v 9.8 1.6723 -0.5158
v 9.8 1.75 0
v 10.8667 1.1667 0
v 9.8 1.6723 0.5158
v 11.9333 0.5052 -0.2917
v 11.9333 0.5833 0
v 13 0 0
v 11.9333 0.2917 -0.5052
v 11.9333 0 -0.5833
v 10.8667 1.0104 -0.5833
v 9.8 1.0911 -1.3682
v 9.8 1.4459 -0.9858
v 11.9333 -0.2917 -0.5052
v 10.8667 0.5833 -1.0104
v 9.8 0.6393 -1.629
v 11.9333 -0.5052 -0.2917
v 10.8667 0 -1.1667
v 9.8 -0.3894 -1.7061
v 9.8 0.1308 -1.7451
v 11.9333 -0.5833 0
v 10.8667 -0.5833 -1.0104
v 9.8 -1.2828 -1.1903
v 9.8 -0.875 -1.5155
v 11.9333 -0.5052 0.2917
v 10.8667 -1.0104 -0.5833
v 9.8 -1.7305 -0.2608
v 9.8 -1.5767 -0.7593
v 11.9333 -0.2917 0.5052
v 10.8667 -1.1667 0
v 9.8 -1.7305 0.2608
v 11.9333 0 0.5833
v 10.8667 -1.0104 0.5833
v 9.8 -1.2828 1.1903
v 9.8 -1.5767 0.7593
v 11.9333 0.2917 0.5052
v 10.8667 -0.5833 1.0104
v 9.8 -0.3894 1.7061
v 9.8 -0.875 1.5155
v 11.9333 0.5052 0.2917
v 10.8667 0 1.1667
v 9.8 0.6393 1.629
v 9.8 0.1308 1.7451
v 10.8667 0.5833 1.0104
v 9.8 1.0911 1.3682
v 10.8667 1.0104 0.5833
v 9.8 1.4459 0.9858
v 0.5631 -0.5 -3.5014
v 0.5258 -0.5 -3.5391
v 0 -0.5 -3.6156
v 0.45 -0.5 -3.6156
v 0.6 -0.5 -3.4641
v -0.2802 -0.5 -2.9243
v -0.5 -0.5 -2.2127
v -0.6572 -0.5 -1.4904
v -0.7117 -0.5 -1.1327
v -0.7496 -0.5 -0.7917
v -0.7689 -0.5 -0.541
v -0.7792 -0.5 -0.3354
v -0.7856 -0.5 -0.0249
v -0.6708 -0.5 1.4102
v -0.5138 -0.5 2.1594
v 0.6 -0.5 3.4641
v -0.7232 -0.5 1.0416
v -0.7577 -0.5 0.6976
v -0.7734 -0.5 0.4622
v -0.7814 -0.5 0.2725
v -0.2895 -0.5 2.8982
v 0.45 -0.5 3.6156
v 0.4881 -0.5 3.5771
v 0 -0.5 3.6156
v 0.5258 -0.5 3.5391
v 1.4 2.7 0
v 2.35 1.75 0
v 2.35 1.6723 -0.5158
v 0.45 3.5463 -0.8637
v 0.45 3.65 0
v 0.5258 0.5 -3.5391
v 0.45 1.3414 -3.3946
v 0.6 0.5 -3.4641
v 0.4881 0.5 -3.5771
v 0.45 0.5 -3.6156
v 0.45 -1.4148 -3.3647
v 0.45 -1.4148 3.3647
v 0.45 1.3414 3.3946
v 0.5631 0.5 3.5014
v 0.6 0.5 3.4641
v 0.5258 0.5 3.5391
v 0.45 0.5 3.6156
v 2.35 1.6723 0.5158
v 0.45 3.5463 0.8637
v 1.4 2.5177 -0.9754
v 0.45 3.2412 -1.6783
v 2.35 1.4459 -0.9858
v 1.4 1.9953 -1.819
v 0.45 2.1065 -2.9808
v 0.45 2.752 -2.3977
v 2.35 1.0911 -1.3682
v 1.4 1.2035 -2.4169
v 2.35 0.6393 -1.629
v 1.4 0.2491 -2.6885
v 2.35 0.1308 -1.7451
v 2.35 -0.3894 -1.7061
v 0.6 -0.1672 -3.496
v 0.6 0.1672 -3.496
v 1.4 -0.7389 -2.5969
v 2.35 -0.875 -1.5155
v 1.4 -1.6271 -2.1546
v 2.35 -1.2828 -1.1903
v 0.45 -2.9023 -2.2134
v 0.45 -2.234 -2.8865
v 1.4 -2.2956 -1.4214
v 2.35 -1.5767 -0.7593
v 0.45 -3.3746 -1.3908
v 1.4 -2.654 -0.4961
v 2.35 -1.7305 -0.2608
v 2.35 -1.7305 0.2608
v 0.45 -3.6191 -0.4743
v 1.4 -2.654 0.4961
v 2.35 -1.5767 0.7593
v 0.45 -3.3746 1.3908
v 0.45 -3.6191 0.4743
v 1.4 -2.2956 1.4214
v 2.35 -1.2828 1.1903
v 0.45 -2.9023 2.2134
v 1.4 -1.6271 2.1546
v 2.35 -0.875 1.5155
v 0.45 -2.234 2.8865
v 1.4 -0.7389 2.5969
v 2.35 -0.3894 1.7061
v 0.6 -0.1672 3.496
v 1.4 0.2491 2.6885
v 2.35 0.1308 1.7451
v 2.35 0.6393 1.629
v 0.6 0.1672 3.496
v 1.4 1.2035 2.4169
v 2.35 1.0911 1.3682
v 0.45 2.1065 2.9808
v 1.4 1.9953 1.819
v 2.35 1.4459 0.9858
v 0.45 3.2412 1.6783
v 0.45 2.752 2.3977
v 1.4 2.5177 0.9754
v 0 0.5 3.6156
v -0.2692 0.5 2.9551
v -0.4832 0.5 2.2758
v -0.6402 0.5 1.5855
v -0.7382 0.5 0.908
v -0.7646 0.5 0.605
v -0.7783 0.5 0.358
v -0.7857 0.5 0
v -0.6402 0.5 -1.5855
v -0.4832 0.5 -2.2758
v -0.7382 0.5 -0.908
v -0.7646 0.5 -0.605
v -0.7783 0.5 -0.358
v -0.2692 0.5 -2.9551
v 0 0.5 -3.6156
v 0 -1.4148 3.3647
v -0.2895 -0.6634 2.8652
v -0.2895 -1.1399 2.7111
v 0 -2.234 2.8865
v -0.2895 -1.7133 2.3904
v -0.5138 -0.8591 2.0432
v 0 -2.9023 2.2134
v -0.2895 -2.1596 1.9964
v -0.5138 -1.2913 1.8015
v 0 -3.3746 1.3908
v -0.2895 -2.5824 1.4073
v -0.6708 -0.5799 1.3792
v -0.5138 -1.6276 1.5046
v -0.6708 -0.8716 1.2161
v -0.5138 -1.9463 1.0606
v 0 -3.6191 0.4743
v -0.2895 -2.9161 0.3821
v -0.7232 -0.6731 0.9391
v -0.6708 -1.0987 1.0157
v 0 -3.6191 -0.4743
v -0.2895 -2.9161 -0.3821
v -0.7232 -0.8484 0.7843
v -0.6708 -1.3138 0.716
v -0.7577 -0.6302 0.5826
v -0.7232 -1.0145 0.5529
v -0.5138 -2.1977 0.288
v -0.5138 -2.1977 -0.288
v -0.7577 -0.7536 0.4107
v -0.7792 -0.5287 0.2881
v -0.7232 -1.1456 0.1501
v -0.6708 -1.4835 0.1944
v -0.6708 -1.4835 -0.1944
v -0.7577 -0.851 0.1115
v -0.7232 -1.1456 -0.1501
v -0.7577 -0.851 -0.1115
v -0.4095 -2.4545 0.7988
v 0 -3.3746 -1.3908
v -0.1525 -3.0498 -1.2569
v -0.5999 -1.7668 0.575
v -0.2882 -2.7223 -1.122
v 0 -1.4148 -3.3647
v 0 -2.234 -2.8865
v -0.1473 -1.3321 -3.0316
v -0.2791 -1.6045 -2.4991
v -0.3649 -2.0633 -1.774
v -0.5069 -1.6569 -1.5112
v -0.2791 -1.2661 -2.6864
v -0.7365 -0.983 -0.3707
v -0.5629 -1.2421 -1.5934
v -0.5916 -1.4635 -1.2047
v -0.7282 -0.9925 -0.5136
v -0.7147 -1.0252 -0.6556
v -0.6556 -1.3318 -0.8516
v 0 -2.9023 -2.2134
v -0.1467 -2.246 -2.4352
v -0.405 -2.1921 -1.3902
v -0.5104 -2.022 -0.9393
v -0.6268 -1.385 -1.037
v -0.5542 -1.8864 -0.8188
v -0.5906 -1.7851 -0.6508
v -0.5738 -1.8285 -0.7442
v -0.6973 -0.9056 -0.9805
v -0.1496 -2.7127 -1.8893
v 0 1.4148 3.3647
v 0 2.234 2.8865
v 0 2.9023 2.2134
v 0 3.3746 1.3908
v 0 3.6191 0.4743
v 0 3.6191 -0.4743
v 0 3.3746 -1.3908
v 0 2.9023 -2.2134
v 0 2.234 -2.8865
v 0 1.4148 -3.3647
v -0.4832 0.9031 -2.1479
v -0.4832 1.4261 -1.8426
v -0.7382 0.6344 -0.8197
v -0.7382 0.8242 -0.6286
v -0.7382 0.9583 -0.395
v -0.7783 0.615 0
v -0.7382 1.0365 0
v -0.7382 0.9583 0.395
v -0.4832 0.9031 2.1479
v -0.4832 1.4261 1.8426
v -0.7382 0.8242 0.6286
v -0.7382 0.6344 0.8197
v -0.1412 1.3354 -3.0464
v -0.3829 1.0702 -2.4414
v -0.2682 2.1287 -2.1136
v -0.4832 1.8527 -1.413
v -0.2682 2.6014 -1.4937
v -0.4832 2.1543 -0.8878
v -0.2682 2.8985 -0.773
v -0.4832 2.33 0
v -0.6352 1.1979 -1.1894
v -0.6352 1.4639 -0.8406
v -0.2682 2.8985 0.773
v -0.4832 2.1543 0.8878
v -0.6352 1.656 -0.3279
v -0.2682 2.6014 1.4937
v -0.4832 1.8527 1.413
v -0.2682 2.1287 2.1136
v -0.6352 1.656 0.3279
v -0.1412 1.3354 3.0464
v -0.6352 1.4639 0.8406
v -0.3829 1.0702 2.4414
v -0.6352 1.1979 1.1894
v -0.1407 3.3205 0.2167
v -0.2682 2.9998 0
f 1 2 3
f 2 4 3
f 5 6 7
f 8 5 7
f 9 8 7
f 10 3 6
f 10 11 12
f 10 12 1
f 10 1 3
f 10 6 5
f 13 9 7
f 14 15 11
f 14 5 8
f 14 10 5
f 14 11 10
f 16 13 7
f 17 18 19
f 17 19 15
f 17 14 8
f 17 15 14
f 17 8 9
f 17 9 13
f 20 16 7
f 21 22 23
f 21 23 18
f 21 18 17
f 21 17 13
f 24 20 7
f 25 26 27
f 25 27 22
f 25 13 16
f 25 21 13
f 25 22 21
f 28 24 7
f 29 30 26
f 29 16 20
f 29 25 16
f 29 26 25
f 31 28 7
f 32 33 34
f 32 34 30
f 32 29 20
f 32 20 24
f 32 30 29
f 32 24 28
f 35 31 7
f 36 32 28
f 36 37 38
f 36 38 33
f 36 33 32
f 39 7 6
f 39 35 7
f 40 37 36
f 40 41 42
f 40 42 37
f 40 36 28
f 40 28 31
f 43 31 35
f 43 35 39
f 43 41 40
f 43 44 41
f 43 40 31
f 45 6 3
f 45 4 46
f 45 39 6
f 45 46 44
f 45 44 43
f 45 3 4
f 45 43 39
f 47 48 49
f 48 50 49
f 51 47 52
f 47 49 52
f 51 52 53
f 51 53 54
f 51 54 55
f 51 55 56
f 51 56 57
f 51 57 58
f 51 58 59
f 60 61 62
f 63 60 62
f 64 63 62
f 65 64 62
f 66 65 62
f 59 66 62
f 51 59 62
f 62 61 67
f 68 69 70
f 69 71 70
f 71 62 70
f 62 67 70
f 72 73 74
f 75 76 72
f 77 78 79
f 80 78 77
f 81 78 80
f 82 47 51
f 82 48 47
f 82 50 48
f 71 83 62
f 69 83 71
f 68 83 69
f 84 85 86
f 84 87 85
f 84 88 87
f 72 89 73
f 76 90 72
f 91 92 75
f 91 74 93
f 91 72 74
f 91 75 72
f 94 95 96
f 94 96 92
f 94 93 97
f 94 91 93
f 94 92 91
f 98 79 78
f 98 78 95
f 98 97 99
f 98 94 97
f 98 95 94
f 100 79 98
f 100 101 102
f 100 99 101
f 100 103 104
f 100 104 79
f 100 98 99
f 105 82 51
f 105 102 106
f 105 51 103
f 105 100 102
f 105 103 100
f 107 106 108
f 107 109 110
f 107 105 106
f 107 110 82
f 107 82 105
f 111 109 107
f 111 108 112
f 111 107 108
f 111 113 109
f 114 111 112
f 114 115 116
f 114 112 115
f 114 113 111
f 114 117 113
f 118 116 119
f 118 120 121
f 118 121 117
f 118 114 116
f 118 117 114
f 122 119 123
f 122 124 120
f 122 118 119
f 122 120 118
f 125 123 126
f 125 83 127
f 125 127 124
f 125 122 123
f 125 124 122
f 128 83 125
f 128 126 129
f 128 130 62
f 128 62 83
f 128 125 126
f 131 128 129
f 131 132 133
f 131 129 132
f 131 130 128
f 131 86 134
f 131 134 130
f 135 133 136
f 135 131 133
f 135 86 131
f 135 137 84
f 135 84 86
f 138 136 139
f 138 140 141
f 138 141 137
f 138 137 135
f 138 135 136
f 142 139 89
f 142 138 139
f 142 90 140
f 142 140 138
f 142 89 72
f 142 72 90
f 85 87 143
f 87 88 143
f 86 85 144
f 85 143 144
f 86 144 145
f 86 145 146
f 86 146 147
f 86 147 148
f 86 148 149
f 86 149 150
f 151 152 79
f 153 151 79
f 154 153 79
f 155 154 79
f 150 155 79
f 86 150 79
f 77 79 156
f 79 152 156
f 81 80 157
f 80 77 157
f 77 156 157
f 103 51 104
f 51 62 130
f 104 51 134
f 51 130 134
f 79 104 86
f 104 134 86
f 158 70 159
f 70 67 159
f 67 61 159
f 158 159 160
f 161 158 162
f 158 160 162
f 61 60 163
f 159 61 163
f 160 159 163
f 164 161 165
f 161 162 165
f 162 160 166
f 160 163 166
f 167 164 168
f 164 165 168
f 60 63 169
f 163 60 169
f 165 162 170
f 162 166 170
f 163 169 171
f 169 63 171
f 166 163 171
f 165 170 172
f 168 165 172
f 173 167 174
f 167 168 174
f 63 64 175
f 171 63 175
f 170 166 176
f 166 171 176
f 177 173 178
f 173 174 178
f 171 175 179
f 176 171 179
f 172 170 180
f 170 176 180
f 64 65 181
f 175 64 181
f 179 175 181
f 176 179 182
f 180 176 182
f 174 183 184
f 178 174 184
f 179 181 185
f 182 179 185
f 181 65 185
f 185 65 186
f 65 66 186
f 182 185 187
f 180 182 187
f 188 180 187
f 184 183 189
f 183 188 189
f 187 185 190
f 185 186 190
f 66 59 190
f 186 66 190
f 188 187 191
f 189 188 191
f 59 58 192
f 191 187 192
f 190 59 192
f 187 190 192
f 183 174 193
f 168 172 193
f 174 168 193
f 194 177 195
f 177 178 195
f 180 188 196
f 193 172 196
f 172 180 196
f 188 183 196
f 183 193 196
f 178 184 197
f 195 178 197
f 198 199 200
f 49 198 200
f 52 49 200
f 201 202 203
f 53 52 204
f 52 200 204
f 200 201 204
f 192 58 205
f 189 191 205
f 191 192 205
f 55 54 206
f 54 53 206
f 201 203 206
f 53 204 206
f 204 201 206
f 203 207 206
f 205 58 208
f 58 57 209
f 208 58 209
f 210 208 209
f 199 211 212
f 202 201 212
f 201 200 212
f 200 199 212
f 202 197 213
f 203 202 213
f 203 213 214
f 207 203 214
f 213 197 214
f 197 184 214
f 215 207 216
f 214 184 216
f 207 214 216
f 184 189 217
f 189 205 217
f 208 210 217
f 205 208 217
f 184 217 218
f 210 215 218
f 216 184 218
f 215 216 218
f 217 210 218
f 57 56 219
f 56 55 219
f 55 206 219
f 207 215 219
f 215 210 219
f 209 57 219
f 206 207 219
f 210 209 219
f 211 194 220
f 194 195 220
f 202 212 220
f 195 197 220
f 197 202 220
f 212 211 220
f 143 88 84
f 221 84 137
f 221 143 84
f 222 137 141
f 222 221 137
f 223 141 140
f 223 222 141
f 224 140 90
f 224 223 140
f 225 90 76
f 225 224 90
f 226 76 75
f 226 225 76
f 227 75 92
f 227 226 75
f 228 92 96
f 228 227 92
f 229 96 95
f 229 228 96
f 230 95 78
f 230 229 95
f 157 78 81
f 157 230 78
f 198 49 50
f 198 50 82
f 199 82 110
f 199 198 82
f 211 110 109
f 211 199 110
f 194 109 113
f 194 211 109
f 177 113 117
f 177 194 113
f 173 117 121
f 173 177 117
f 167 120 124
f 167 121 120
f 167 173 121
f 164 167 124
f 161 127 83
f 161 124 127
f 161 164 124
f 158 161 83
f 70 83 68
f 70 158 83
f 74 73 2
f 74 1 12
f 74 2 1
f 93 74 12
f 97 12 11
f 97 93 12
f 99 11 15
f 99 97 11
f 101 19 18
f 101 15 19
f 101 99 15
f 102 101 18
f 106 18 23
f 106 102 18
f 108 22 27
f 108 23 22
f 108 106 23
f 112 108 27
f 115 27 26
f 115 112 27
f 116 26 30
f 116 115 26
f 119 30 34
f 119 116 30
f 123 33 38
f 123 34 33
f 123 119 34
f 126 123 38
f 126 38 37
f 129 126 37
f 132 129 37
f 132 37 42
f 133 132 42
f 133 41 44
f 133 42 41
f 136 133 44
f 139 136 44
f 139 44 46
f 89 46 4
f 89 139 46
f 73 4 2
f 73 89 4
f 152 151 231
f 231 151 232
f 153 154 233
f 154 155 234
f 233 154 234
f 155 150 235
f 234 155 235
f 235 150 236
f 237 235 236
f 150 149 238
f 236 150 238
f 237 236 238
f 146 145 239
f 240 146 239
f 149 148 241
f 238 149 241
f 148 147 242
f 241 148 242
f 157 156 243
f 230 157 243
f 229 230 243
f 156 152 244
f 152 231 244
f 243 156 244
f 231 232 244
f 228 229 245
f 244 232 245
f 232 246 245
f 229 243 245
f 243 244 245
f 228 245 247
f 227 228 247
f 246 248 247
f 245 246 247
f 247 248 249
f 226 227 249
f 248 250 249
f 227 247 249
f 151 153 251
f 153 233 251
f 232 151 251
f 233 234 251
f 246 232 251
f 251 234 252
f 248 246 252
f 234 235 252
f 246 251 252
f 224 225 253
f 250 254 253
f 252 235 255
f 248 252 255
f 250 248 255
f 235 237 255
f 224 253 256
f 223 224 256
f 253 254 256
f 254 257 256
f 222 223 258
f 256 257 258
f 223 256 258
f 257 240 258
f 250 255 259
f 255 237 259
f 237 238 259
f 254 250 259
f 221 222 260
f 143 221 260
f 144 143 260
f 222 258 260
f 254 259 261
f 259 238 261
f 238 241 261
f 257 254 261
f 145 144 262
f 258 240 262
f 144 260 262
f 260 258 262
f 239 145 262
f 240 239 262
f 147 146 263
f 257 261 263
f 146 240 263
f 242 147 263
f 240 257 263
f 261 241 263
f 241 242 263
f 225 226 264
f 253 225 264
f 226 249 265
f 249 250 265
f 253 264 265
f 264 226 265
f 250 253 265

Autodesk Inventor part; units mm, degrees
ref_plane "YZ Plane" through (0, 0, 0) normal (1, 0, 0) x (0, 1, 0)
sketch "Sketch1" plane through (0, 0, 0) normal (0, 0, 1) x (1, 0, 0)
  line L0 (13, 0) -> (13, 1.75)
  line L1 (13, 1.75) -> (2.35, 1.75)
  line L2 (0.45, 3.65) -> (0, 3.65)
  line L3 (0, 3.65) -> (0, 0) construction
  arc A0 (0, 3.65) -> (-0.8, 0) centre (7.9266, 0) ccw
  line L4 (-3.7972, 0) -> (15.7995, 0) projected
  line L5 (0, -0.7387) -> (0, 4.432) projected
  line L6 (-0.8, 0) -> (-0.8, 3.65) construction
  line L7 (-0.8, 3.65) -> (0, 3.65) construction
  line L8 (0, 3.65) -> (0, 0)
  line L9 (-0.8, 0) -> (0, 0)
  line L10 (0, 0) -> (13, 0)
  line L11 (0.45, 3.65) -> (2.35, 1.75)
  dimension "d0" = 0.8
  dimension "d1" = 3.5
  dimension "d2" = 7.3
  dimension "d11" = 45
  dimension "d14" = 2.35
  dimension "d15" = 10.65
revolve "Body" add sketch "Sketch1" angle 360 about axis through (0, 0, 0) along (1, 0, 0)
ref_plane "IDS_WORKPLANE{1}" through (-0.8, 0, 0) normal (1, 0, 0) x (0, 1, 0)
sketch "Sketch2" plane through (-0.8, 0, 0) normal (1, 0, 0) x (0, 1, 0)
  line L0 (0, -5.11) -> (0, 5.11) projected
  line L1 (-5.11, 0) -> (5.11, 0) projected
  line L2 (0.5, -3.65) -> (-0.5, -3.65)
  line L3 (-0.5, -3.65) -> (-0.5, 3.65)
  line L4 (-0.5, 3.65) -> (0.5, 3.65)
  line L5 (0.5, 3.65) -> (0.5, -3.65)
  line L6 (0, 3.65) -> (0, -3.65) construction
  line L7 (-0.5, 0) -> (0.5, 0) construction
  circle A0 centre (0, 0) radius 3.65 projected
  dimension "d8" = 1
extrude "Slot" cut sketch "Sketch2" along normal blind 1.4 contours A0 L3 L1 L0 | A0 L5 L2 | L2 L3 A0 | L0 L1 L5 A0 | L1 L3 A0 L0 | L0 A0 L5 L1 | A0 L3 L4 | L4 L5 A0
thread "Thread" size "ST3.5x1.3" class "6g" standard "Metric Forming Screw Threads" length 10.65
chamfer "Chamfer1" distance 1.75 distance2 3.2 1 edges at (13, -1.75, 0) measured on face at (13, -0.4366, 0.1076)
ref_plane "Work Plane2" through (3.5, 0, 0) normal (0, 0, -1) x (1, 0, 0)
equation "\"d0\" = KR"
equation "\"d1\" = NND"
equation "\"d2\" = KOD"
equation "\"d11\" = 0.5 * SEWI"
equation "\"d14\" = KOH"
equation "\"d15\" = GEL"
equation "\"d8\" = SBR"
equation "\"d9\" = STI"
equation "\"d3\" = GEL"
equation "\"d5\" = -0.5 * GD2 + 0.5 * NND"
equation "\"d6\" = SPTZ"
equation "\"NND\" = 3.5"
equation "\"GEL\" = 10.65"
equation "\"KOD\" = 7.3"
equation "\"KOH\" = 2.35"
equation "\"STI\" = 1.4"
equation "\"SBR\" = 1"
equation "\"KR\" = 0.8"
equation "\"SPTZ\" = 3.2"
equation "\"GD2\" = 0"
equation "\"SEWI\" = 90deg"
equation "\"d7\" = -KR"
equation "\"EPV\" = 4.1"
equation "\"THREADDIA\" = 3.5"
equation "\"TOA\" = 30deg"
equation "\"NLG\" = 13"
equation "\"PTC\" = 1.3"
equation "\"GD1\" = 2.64"
properties part number "ISO 1483 - ST3.5 x 13 - C" material "Steel"
